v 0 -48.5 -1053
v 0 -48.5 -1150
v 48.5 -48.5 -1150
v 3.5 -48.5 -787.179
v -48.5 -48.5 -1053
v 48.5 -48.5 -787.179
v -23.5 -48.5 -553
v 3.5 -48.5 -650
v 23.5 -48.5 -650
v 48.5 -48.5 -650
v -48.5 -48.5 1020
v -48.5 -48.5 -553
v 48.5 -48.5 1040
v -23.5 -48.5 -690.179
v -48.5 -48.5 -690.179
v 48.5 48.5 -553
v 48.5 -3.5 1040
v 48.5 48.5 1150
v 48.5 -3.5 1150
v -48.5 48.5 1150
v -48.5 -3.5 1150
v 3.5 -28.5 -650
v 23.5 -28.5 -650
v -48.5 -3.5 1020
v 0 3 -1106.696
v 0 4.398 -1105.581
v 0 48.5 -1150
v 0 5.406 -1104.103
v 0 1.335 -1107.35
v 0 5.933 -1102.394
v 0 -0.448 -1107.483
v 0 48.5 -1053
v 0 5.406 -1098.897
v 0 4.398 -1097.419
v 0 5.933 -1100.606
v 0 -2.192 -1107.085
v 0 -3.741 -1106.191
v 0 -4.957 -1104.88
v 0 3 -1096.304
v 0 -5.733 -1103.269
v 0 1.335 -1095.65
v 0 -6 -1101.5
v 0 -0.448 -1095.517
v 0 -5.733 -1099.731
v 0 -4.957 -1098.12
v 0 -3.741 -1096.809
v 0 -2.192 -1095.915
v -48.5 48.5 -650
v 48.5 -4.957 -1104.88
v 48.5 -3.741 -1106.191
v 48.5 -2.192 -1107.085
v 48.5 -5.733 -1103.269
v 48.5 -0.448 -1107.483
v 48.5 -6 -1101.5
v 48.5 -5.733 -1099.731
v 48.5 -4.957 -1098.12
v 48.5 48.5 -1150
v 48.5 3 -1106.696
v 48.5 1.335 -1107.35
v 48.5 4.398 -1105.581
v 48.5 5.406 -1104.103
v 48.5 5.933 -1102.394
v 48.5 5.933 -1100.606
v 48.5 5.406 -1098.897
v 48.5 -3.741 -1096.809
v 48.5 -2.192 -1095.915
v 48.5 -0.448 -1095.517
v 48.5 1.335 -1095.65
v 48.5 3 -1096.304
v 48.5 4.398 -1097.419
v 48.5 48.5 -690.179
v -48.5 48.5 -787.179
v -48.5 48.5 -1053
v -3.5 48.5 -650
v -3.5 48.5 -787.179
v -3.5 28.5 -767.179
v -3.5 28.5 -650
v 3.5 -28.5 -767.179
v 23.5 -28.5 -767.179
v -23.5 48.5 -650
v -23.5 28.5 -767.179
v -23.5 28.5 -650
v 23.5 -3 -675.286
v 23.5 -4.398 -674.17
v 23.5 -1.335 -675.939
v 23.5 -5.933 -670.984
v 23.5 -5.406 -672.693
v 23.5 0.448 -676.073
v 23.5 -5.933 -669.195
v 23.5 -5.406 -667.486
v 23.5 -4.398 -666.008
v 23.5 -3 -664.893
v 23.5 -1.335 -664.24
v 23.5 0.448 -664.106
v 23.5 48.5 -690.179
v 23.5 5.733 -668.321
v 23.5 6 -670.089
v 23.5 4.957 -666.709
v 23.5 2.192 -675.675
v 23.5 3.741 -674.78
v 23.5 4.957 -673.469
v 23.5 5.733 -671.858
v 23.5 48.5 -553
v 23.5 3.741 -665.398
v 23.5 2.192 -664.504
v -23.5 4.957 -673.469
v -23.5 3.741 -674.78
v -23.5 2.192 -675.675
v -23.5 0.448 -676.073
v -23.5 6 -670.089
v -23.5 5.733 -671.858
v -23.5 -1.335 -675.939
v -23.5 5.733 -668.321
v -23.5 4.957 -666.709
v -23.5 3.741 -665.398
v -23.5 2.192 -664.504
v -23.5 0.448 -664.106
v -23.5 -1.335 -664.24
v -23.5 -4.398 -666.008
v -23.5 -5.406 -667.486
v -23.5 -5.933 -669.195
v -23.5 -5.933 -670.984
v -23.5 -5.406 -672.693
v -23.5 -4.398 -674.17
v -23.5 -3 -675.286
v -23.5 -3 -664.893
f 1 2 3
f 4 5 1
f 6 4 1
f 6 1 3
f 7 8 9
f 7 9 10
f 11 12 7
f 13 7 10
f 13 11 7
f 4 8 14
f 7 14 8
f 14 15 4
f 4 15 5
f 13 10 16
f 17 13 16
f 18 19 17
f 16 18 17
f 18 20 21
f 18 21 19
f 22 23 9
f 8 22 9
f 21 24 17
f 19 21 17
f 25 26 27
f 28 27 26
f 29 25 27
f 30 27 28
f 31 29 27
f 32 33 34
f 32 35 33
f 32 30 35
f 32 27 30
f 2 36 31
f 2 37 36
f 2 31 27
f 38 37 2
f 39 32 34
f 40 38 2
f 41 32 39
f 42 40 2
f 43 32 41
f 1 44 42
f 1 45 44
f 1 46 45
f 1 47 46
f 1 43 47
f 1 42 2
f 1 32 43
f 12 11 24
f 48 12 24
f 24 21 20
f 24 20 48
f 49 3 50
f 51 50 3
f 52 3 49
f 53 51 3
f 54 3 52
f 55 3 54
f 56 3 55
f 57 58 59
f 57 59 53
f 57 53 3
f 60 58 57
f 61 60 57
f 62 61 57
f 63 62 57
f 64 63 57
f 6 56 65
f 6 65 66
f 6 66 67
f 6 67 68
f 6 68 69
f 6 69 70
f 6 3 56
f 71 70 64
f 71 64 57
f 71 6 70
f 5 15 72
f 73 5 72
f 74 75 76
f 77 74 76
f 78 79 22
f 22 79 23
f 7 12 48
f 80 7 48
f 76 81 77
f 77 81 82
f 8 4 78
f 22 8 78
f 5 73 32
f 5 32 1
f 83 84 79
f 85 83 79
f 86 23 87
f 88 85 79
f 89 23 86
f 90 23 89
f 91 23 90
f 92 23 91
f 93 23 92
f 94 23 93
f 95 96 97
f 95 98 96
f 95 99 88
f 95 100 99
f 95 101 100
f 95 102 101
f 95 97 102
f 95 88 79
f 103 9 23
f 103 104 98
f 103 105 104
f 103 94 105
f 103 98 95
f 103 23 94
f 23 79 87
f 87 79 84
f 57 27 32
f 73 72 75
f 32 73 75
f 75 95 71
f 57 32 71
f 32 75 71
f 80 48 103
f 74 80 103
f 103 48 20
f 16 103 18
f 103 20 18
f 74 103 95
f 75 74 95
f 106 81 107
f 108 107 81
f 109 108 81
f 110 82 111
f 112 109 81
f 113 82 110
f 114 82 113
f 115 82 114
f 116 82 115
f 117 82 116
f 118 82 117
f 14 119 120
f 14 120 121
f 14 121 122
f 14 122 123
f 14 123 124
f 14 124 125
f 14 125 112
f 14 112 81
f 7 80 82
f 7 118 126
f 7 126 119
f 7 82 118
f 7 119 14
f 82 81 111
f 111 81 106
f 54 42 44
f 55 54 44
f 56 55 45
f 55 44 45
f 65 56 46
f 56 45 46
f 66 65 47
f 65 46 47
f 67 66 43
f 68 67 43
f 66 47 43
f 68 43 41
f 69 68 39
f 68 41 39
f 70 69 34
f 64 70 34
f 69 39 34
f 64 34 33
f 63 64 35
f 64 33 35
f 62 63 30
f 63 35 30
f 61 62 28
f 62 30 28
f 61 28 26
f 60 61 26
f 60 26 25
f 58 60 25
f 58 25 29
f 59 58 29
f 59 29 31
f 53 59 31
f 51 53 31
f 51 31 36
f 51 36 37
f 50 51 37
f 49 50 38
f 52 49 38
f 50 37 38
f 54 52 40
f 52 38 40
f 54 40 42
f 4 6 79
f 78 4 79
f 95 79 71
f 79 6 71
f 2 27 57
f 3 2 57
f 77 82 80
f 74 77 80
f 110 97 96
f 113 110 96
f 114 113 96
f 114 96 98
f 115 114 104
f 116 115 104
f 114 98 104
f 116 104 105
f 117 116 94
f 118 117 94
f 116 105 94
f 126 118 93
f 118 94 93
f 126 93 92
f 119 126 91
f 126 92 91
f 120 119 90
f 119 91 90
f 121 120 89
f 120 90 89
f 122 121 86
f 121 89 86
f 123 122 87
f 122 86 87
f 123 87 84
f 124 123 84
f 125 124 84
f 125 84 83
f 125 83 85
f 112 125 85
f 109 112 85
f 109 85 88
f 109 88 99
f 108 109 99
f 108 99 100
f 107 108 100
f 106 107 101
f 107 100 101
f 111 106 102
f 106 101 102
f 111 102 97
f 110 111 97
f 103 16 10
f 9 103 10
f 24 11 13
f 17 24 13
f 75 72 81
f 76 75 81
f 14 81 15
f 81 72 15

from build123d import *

# Parameters (mm, degrees)
F0_W      = 97
F0_H      = 97
F1_DEPTH  = 1150
F2_W      = 97
F2_H      = 97
F3_DEPTH  = 48.5
F5_DEPTH  = 45
F7_DEPTH  = 25
F9_DEPTH  = 25
F11_DEPTH = 20
F12_R     = 6
F13_DEPTH = 47
F14_R     = 6
F15_DEPTH = 48.5
F17_DEPTH = 45


with BuildPart() as f1:
    # F0 (on Top) → F1 (new body, symmetric)
    with BuildSketch(Plane.XY):
        Rectangle(F0_W, F0_H)
    extrude(amount=F1_DEPTH, both=True)

    # F2 (on face) → F3 (cut)
    with BuildSketch(Plane(origin=(-48.5, 0, 0), x_dir=(0, -1, 0), z_dir=(-1, 0, 0))):
        with Locations((0, -1101.5)):
            Rectangle(F2_W, F2_H)
    extrude(amount=-F3_DEPTH, mode=Mode.SUBTRACT)

    # F4 (on face) → F5 (cut)
    with BuildSketch(Plane.YZ.offset(48.5)):
        Polygon((-28.5, -650), (-48.5, -650), (-48.5, -787.178716), (-28.5, -767.178716), align=None)
    extrude(amount=-F5_DEPTH, mode=Mode.SUBTRACT)

    # F6 (on face) → F7 (cut)
    with BuildSketch(Plane(origin=(-48.5, 0, 0), x_dir=(0, -1, 0), z_dir=(-1, 0, 0))):
        Polygon((-48.5, -650), (-48.5, -787.178716), (48.5, -690.178716), (48.5, -553), align=None)
    extrude(amount=-F7_DEPTH, mode=Mode.SUBTRACT)

    # F8 (on face) → F9 (cut)
    with BuildSketch(Plane.YZ.offset(48.5)):
        Polygon((48.5, -690.178716), (48.5, -553), (-48.5, -650), (-48.5, -787.178716), align=None)
    extrude(amount=-F9_DEPTH, mode=Mode.SUBTRACT)

    # F10 (on face) → F11 (cut)
    with BuildSketch(Plane(origin=(-23.5, 0, 0), x_dir=(0, -1, 0), z_dir=(-1, 0, 0))):
        Polygon((-48.5, -650), (-48.5, -787.178716), (-28.5, -767.178716), (-28.5, -650), align=None)
    extrude(amount=-F11_DEPTH, mode=Mode.SUBTRACT)

    # F12 (on face) → F13 (cut, through all)
    with BuildSketch(Plane.YZ.offset(23.5)):
        with Locations((0, -670.089358)):
            Circle(F12_R)
    extrude(amount=-F13_DEPTH, mode=Mode.SUBTRACT)

    # F14 (on face) → F15 (cut, through all)
    with BuildSketch(Plane(origin=(0, 0, 0), x_dir=(0, -1, 0), z_dir=(-1, 0, 0))):
        with Locations((0, -1101.5)):
            Circle(F14_R)
    extrude(amount=-F15_DEPTH, mode=Mode.SUBTRACT)

    # F16 (on face) → F17 (cut)
    with BuildSketch(Plane.XZ.offset(48.5)):
        Polygon((48.5, 1150), (-48.5, 1150), (-48.5, 1020), (48.5, 1040), align=None)
    extrude(amount=-F17_DEPTH, mode=Mode.SUBTRACT)


solid = f1.part
